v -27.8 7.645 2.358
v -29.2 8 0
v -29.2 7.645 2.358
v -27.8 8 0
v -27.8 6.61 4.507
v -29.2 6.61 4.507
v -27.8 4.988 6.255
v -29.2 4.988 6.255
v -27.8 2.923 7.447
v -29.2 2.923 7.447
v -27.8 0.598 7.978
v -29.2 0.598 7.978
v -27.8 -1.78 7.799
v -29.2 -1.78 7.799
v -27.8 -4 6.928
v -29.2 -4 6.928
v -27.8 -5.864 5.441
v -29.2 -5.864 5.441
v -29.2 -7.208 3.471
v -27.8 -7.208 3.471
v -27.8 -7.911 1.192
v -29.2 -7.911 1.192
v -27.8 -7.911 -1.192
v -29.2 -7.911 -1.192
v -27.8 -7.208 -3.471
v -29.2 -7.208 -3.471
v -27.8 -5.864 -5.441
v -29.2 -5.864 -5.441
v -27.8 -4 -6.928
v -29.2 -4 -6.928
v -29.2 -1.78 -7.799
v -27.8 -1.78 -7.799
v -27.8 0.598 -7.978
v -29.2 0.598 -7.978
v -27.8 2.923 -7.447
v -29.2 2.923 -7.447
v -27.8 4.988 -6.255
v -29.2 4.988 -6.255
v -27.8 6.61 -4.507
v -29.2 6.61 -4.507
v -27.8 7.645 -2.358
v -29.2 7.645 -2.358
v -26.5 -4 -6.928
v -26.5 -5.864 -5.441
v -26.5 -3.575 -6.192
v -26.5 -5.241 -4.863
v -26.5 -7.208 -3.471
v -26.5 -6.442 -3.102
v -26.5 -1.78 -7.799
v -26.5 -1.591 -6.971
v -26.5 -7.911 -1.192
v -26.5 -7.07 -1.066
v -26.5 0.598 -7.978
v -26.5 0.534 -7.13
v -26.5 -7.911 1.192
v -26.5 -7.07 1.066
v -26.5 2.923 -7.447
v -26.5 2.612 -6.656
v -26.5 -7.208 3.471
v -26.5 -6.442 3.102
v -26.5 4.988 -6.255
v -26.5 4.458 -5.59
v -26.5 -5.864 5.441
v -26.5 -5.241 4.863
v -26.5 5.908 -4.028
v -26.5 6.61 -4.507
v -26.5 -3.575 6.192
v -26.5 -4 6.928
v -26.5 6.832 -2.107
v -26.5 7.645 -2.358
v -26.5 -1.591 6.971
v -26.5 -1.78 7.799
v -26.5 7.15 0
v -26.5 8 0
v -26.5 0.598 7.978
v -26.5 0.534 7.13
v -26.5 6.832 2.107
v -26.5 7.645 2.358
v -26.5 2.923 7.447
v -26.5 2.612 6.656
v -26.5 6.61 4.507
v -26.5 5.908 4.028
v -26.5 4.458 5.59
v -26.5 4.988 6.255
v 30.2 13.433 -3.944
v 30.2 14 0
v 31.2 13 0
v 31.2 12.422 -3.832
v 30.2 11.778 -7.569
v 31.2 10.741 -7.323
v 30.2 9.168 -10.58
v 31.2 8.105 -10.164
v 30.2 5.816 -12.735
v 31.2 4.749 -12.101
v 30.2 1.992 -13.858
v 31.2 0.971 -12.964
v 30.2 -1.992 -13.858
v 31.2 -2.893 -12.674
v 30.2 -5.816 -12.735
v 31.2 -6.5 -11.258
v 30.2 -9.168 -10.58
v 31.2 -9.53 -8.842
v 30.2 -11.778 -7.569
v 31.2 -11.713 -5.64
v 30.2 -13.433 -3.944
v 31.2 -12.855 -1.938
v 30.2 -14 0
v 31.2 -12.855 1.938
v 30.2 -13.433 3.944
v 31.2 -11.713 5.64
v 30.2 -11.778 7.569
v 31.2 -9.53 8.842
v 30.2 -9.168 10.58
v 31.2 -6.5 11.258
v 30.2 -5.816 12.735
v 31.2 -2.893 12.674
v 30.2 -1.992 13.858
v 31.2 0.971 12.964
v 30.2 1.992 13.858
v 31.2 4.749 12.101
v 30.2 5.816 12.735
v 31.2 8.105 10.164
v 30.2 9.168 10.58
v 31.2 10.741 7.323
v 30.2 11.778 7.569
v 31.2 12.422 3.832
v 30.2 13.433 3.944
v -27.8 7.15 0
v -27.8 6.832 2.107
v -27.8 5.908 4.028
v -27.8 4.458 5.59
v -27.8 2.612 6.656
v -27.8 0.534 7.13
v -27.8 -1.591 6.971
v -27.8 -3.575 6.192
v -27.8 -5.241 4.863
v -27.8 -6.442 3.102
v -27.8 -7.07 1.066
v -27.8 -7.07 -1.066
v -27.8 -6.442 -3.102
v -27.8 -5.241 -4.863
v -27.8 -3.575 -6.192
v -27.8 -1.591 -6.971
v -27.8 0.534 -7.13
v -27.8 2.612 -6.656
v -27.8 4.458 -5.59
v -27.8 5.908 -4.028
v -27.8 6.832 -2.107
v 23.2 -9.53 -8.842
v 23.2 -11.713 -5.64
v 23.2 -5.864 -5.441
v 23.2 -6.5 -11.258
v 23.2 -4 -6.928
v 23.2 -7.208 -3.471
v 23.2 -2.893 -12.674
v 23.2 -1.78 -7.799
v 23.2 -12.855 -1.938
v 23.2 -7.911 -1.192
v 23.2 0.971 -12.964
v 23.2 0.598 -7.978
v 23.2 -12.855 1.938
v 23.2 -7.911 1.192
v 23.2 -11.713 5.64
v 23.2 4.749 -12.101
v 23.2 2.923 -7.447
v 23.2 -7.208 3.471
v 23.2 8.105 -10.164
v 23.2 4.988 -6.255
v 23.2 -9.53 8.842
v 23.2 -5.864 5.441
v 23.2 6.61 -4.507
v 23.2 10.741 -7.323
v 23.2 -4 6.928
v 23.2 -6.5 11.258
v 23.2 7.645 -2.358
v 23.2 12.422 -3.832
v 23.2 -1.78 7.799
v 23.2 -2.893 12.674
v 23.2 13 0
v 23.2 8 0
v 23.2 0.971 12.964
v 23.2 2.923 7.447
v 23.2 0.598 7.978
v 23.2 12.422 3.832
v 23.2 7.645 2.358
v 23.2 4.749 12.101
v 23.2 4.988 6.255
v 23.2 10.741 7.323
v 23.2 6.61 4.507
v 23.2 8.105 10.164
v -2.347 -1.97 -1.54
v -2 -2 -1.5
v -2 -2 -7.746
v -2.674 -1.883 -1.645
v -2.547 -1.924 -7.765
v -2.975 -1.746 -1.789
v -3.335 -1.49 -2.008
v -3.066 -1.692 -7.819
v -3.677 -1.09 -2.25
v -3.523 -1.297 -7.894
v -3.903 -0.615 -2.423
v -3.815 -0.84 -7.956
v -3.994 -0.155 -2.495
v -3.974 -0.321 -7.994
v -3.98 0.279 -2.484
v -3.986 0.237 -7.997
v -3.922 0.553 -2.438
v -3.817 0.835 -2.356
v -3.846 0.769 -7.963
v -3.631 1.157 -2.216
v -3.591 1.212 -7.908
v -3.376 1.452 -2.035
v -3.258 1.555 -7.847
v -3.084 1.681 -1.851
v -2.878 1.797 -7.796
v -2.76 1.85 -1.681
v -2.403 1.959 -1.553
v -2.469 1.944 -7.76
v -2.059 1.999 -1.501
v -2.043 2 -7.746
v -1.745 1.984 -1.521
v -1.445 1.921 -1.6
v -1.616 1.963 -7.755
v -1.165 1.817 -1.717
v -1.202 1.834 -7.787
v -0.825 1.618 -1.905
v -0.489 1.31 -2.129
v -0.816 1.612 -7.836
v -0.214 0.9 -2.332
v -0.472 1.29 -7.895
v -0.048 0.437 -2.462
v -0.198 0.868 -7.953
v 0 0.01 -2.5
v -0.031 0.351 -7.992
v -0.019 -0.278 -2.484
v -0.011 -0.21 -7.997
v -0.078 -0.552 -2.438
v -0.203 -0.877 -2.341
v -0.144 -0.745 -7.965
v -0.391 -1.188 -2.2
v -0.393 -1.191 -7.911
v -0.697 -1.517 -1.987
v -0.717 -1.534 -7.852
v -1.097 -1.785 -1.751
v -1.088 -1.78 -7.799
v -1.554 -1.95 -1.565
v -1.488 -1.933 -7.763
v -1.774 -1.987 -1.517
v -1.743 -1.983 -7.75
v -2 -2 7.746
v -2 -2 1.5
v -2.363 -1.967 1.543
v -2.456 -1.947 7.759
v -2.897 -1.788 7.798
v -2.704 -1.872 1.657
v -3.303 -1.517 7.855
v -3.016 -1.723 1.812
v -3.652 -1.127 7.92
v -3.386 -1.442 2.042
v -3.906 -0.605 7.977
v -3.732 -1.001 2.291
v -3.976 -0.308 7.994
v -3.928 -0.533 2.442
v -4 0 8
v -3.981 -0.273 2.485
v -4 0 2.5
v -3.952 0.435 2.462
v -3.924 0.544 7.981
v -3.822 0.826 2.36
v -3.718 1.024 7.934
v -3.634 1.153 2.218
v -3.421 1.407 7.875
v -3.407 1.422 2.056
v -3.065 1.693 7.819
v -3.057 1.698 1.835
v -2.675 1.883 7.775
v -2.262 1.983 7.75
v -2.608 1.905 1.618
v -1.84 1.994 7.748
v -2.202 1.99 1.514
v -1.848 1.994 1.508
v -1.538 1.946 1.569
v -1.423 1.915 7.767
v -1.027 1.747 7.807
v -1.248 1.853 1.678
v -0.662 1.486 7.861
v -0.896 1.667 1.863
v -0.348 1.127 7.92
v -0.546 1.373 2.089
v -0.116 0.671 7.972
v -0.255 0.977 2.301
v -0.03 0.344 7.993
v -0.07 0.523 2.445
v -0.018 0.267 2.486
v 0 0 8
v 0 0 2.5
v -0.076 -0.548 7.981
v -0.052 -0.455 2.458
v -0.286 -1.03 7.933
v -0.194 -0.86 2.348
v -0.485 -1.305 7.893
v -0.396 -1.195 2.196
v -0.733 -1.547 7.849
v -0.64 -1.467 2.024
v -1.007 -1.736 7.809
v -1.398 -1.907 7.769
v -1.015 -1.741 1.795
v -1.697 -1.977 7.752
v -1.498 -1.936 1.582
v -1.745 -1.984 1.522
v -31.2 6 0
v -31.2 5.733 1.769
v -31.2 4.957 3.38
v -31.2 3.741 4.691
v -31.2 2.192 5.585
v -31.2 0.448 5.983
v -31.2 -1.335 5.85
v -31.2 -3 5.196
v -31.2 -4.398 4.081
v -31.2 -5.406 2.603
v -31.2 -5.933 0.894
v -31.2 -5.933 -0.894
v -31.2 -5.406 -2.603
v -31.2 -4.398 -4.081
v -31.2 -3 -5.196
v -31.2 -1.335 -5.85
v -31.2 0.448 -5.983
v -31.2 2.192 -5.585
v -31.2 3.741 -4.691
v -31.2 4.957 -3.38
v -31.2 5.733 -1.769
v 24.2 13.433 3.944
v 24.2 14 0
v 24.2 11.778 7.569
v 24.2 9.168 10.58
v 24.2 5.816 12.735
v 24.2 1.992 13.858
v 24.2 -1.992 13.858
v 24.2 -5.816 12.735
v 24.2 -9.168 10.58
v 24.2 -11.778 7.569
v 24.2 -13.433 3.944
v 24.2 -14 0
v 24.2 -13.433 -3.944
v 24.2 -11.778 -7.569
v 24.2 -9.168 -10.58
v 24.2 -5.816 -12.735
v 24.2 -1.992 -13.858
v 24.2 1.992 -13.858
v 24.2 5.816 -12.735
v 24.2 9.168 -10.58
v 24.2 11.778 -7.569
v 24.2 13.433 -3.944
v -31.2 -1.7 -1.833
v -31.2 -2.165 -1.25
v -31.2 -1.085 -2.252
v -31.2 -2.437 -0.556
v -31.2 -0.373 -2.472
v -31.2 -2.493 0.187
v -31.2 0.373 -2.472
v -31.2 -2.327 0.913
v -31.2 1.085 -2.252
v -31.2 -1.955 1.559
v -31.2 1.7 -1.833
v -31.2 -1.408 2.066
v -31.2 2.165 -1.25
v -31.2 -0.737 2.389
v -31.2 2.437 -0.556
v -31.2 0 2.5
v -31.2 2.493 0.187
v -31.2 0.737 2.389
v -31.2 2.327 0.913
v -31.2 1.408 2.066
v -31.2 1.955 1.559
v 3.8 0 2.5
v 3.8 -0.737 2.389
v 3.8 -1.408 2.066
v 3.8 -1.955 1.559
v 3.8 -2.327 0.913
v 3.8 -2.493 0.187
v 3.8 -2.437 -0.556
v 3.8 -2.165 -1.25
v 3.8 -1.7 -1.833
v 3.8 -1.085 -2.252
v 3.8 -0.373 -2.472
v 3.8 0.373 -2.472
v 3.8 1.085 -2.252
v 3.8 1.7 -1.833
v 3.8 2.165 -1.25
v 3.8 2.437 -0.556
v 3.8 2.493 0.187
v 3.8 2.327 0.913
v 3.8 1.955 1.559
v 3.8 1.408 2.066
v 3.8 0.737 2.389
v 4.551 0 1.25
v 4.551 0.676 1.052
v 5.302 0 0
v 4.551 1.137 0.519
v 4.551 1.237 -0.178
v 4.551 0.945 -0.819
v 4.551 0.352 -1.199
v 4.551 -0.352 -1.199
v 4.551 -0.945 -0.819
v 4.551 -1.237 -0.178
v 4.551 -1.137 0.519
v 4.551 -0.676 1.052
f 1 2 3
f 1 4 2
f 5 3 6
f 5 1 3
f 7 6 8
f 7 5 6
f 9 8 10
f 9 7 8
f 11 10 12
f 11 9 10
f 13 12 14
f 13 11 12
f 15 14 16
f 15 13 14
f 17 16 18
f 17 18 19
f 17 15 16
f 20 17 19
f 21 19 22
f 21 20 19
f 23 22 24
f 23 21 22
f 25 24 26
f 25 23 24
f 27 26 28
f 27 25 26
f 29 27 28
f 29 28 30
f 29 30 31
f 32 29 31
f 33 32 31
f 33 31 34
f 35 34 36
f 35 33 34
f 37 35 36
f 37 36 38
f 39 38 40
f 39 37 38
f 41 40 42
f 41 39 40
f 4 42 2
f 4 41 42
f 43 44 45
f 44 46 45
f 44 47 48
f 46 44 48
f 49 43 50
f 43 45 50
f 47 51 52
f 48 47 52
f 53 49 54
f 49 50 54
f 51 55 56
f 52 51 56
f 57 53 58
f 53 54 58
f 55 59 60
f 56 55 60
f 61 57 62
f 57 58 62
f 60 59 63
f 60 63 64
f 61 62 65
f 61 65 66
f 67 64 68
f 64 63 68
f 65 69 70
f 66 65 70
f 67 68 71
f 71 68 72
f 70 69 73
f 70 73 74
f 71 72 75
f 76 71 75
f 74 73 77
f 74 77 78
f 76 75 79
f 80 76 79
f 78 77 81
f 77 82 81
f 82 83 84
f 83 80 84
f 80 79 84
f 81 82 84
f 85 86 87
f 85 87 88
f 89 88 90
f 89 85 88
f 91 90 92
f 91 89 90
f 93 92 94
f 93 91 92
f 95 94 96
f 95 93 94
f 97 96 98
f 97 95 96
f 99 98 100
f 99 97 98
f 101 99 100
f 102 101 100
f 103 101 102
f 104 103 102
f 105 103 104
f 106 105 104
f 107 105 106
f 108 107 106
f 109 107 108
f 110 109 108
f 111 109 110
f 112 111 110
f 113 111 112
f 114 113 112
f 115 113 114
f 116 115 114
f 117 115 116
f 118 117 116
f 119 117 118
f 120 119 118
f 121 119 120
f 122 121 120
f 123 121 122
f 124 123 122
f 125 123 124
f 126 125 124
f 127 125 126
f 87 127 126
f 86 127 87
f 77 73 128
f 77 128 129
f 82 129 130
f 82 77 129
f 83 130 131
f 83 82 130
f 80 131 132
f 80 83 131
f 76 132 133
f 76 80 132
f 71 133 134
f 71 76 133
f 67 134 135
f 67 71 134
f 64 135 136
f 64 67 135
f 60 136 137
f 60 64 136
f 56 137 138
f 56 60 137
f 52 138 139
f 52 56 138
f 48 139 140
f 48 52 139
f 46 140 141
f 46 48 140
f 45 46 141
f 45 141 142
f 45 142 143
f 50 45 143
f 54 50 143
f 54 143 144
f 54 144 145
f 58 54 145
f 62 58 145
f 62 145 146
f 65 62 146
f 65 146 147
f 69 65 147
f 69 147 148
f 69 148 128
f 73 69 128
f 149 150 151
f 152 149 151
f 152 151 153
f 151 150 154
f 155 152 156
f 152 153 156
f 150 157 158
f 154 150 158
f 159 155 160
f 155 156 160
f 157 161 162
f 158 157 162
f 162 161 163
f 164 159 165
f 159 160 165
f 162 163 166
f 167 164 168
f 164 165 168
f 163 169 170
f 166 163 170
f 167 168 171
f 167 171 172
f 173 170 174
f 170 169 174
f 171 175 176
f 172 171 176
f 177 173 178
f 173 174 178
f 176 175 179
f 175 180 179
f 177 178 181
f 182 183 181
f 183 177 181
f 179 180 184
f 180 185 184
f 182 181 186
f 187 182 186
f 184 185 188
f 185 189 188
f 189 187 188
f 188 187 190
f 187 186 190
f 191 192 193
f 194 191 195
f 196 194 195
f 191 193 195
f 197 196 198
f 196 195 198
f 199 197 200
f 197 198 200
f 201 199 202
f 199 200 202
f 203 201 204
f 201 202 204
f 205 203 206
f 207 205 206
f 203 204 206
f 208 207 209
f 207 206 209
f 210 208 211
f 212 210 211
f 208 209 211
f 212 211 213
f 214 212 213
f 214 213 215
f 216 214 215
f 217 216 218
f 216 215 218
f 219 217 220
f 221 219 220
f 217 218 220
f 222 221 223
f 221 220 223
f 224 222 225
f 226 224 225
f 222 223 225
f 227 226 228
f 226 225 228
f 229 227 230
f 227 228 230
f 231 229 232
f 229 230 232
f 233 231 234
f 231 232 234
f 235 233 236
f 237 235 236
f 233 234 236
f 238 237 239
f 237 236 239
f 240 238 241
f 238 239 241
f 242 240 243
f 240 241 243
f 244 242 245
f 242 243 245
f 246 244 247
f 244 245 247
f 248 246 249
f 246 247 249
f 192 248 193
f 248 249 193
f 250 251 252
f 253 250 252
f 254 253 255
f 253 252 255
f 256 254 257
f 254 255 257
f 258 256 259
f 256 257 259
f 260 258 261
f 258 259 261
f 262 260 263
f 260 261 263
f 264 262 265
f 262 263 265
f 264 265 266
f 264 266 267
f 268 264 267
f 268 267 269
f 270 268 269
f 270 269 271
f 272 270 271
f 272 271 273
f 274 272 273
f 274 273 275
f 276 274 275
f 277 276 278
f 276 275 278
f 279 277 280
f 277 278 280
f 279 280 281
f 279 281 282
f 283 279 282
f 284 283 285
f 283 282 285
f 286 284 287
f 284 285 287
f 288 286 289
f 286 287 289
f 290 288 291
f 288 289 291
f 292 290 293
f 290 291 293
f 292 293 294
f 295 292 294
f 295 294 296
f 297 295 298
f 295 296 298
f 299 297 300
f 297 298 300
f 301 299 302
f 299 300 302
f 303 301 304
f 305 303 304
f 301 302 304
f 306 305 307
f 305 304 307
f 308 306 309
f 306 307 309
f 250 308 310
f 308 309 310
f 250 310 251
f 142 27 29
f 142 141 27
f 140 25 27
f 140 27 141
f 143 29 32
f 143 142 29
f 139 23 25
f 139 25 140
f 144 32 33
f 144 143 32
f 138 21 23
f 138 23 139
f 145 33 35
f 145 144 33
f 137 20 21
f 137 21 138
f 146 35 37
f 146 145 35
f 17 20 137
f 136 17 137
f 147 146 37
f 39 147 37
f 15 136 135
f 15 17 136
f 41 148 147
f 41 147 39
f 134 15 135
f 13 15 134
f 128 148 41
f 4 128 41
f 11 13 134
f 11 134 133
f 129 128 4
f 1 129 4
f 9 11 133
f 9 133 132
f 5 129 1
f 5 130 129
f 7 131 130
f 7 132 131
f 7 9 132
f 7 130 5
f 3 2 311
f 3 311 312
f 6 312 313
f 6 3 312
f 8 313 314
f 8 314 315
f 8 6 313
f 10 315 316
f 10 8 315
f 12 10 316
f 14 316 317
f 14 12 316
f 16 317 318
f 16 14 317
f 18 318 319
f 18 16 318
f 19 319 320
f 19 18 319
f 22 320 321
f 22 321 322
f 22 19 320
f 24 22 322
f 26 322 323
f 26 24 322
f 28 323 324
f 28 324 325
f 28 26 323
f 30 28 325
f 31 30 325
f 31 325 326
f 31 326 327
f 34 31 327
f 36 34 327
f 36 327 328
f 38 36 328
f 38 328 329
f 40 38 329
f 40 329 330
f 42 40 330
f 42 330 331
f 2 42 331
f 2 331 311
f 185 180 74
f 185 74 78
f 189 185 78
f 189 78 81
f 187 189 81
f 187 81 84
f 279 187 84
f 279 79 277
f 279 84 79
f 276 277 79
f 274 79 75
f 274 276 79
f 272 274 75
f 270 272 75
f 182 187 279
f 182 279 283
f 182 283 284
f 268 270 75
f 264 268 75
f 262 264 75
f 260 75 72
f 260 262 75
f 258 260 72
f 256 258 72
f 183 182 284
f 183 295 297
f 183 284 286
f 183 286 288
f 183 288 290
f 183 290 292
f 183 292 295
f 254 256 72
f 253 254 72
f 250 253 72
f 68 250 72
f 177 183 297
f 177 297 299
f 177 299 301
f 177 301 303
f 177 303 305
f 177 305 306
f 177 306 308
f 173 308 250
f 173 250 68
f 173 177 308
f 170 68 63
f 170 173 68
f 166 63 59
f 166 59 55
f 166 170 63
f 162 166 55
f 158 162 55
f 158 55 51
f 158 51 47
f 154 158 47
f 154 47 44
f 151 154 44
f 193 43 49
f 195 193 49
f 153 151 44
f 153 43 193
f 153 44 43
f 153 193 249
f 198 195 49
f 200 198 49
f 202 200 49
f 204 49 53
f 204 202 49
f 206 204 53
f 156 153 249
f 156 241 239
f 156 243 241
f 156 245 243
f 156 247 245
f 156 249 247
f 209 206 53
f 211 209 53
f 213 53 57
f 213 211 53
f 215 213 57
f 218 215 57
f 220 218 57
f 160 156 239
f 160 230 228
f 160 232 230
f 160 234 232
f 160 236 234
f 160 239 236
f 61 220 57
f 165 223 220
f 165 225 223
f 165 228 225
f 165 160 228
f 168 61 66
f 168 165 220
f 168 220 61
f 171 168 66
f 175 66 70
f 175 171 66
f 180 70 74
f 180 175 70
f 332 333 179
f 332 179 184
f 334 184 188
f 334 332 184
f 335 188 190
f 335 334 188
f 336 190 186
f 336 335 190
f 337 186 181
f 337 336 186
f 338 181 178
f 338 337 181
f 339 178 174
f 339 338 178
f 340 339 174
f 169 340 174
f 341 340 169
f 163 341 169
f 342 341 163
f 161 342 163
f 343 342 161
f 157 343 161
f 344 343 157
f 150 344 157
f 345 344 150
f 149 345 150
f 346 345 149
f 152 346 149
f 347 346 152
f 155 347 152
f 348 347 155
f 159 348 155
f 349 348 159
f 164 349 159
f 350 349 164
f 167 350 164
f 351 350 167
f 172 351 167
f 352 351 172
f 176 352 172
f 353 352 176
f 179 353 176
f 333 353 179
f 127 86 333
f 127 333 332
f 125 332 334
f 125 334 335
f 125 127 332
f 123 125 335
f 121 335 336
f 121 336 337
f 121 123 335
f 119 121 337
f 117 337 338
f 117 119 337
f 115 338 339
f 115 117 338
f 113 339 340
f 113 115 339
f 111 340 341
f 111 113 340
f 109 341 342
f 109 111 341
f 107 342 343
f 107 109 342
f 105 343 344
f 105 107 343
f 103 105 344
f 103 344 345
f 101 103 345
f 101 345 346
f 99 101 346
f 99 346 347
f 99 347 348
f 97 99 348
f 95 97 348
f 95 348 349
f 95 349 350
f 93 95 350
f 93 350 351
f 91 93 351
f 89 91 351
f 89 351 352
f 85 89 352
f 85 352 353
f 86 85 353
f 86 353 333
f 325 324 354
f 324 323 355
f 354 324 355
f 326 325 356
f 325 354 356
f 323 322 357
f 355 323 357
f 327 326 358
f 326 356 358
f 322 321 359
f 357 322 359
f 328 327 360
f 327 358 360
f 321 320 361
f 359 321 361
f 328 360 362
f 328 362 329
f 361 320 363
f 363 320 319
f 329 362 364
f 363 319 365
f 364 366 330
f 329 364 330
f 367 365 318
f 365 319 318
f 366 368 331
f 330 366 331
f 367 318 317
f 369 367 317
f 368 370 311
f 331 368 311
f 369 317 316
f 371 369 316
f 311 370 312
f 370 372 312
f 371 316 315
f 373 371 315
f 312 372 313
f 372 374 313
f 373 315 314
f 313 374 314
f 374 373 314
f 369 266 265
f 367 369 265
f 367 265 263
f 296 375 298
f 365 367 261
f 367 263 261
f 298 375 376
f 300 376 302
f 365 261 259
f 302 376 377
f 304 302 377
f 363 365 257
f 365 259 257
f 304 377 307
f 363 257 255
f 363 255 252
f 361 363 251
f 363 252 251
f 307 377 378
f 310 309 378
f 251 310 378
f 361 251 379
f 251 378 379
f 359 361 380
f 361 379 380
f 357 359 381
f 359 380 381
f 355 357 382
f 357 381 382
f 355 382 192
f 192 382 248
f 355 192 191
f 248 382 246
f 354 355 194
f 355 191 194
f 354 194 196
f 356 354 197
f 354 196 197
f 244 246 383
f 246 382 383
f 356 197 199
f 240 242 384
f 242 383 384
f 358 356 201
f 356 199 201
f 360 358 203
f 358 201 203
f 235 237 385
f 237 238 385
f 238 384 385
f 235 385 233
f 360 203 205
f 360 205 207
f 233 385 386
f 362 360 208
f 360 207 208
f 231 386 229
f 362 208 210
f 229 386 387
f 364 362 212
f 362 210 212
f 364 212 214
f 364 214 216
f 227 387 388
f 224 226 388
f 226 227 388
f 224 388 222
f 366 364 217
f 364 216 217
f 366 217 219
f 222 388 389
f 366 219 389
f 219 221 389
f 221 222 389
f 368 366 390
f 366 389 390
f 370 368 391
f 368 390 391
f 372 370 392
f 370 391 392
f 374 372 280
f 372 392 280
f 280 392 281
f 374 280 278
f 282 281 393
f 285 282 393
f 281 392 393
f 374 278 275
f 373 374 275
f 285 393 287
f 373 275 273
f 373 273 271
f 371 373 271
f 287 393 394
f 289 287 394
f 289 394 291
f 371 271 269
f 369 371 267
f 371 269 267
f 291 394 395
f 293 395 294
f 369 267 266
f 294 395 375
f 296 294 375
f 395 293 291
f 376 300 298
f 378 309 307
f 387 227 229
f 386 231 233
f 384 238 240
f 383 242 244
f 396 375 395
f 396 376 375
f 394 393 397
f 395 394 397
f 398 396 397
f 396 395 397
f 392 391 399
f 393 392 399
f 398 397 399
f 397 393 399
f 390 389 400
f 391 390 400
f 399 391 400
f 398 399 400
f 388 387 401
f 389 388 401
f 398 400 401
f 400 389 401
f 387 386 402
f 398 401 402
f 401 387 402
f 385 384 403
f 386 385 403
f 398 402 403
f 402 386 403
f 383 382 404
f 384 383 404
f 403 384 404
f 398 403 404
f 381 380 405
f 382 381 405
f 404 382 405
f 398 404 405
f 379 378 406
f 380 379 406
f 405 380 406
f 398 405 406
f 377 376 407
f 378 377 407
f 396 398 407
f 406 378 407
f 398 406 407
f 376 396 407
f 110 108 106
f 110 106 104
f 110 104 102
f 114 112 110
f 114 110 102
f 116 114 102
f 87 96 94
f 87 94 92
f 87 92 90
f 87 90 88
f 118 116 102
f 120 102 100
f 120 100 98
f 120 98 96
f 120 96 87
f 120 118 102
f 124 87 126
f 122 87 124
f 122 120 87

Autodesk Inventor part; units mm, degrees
ref_plane "YZ Plane" through (0, 0, 0) normal (1, 0, 0) x (0, 1, 0)
ref_plane "XZ Plane" through (0, 0, 0) normal (0, 1, 0) x (-1, 0, 0)
sketch "Skizze1" plane through (0, 0, 0) normal (0, 0, 1) x (1, 0, 0)
  line L0 (-31.2, 0) -> (-31.2, 8)
  line L1 (-31.2, 8) -> (-27.8, 8)
  line L2 (-27.8, 8) -> (-27.8, 7.15)
  line L3 (-27.8, 7.15) -> (-26.5, 7.15)
  line L4 (-26.5, 7.15) -> (-26.5, 8)
  line L5 (-26.5, 8) -> (23.2, 8)
  line L6 (23.2, 8) -> (23.2, 14)
  line L7 (23.2, 14) -> (31.2, 14)
  line L8 (31.2, 14) -> (31.2, 0)
  line L9 (-43.68, 0) -> (43.68, 0) projected
  line L10 (0, -2.8) -> (0, 16.8) projected
  line L11 (-31.2, 0) -> (31.2, 0)
  point P0 (0, 0)
  dimension "d0" = 49.7
  dimension "d1" = 8
  dimension "d2" = 6
  dimension "d3" = 1.3
  dimension "d4" = 0.85
  dimension "d5" = 3.4
  dimension "d6" = 8
revolve "Umdrehung1" add sketch "Skizze1" angle 360 about axis through (-10, 0, 0) along (1, 0, 0)
chamfer "Fase1" distance 2 angle 45 1 edges at (-31.2, -8, 0)
chamfer "Fase2" distance 1 angle 45 1 edges at (31.2, -14, 0)
chamfer "Fase3" distance 1 angle 45 1 edges at (23.2, -14, 0)
sketch "Skizze4" plane through (-31.2, 0, 0) normal (-1, 0, 0) x (0, 0, 1)
  point P0 (0, 0)
  point P1 (0, 0)
hole "Bohrung2" at (-31.2, 0, 0) direction (1, 0, 0) diameter 5 depth 35 tip angle 118
ref_plane "Arbeitsebene1" through (0, 0, 8) normal (0, 0, 1) x (1, 0, 0)
sketch "Skizze5" plane through (0, 0, 8) normal (0, 0, 1) x (1, 0, 0)
  line L0 (-2.4, 0) -> (0.4, 0) projected
  point P0 (0, 0)
  point P1 (-2, 0)
  dimension "d46" = 2
hole "Bohrung3" at (-2, 0, 8) direction (0, 0, -1) diameter 4 end through all
thread "Gewinde1" size "M5x0.8" class "6H" standard "ANSI Metric M Profile" length 15
properties part number "KON_Nietmaschine_Bolzen" material "Stahl"
